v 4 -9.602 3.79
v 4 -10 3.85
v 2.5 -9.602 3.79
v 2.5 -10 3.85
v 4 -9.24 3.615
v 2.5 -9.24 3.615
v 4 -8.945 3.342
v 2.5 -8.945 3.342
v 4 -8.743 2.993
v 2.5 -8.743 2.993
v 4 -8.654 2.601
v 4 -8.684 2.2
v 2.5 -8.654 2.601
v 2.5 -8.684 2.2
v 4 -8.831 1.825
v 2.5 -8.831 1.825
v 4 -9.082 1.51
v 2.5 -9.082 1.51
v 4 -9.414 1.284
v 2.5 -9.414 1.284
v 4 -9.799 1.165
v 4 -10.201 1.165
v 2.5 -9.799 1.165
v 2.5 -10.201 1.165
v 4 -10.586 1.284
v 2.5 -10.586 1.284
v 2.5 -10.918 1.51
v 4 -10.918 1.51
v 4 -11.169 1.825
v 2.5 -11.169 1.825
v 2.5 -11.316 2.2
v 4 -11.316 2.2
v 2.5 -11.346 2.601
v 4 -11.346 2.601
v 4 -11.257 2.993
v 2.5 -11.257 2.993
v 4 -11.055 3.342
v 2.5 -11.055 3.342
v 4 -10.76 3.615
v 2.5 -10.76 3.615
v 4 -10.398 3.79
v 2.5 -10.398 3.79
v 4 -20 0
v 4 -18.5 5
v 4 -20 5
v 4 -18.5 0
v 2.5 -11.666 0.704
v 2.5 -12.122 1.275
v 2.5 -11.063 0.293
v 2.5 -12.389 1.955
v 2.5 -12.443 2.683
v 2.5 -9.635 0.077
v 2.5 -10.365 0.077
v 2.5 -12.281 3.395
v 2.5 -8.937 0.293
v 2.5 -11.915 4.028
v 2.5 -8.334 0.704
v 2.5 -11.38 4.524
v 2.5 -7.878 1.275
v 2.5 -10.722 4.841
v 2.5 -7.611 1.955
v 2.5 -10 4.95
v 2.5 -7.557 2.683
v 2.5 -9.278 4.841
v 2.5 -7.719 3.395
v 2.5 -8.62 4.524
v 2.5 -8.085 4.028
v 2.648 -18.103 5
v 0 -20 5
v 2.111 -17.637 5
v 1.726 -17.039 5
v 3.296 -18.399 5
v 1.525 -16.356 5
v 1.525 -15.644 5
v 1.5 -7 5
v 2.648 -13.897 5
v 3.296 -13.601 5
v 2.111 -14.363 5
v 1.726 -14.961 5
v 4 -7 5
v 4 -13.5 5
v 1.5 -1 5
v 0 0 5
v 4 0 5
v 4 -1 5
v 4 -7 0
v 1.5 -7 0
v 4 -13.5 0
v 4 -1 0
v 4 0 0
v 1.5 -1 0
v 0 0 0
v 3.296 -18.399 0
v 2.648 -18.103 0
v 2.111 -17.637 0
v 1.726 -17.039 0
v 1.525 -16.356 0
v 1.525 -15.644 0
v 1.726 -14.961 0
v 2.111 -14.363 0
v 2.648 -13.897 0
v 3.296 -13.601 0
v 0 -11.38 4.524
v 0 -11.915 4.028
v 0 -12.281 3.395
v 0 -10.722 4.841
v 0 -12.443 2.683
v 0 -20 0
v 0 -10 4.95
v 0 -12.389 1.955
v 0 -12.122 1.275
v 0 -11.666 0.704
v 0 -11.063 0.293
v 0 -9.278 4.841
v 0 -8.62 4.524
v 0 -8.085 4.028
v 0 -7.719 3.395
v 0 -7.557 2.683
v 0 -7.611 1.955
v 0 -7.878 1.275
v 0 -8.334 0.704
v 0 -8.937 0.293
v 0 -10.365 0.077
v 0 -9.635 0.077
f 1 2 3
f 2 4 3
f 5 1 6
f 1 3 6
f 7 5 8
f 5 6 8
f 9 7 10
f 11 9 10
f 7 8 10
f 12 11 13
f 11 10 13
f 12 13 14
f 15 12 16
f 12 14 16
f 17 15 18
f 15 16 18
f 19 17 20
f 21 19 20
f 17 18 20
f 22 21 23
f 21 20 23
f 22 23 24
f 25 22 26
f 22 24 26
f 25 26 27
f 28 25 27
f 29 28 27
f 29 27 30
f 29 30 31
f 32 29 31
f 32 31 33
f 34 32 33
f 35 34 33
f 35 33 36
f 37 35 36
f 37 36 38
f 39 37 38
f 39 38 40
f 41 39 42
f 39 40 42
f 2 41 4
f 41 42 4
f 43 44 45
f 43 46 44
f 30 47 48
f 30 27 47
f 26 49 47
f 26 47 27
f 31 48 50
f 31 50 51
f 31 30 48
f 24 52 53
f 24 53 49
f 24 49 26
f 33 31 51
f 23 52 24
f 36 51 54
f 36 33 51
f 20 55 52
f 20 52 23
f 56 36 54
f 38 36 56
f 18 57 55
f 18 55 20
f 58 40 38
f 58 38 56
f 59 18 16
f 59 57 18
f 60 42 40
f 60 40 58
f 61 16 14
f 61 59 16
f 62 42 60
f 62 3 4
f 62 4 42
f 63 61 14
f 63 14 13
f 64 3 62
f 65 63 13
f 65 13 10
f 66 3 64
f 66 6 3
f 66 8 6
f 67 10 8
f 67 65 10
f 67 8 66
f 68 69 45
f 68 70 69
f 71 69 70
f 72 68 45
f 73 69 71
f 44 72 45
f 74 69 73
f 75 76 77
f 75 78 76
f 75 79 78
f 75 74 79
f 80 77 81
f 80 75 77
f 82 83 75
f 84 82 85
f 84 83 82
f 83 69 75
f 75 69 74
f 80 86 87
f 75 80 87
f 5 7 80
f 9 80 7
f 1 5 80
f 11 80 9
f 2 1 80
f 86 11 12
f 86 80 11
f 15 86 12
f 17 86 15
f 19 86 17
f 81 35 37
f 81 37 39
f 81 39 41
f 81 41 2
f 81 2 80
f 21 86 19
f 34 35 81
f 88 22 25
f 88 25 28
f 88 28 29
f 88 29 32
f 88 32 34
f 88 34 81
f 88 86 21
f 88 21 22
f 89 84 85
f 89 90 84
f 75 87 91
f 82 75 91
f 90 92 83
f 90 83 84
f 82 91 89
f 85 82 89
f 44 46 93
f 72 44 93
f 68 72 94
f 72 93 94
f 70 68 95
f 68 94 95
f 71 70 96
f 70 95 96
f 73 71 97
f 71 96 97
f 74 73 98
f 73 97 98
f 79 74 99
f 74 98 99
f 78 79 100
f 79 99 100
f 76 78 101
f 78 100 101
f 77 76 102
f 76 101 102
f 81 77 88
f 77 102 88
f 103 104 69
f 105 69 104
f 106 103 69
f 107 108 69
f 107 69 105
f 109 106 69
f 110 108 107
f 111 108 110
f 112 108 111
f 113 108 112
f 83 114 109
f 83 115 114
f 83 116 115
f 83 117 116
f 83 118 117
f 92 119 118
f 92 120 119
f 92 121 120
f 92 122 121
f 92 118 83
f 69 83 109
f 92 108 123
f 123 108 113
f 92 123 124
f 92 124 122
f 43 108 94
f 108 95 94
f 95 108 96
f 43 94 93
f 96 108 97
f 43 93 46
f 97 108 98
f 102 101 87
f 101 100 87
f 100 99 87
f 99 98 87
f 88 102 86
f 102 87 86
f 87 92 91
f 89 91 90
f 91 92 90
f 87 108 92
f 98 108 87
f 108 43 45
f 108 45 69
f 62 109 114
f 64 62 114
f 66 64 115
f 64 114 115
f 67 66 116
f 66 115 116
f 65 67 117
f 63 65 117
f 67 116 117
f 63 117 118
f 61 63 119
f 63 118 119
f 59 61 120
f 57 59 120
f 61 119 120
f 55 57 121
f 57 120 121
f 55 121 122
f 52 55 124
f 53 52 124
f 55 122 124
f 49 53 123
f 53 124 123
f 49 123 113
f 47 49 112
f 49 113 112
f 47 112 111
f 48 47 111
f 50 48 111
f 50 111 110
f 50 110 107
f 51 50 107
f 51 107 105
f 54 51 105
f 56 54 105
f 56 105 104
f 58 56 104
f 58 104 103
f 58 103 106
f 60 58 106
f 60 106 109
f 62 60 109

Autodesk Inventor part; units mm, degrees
ref_plane "YZ Plane" through (0, 0, 0) normal (1, 0, 0) x (0, 1, 0)
ref_plane "XZ Plane" through (0, 0, 0) normal (0, 1, 0) x (-1, 0, 0)
ref_plane "XY Plane" through (0, 0, 0) normal (0, 0, 1) x (1, 0, 0)
sketch "Sketch1" plane through (0, 0, 0) normal (0, 0, 1) x (1, 0, 0)
  line L0 (0, 0) -> (4, 0)
  line L1 (4, 0) -> (4, -20)
  line L2 (4, -20) -> (0, -20)
  line L3 (0, -20) -> (0, 0)
  circle A0 centre (4, -4) radius 2.5
  circle A1 centre (4, -16) radius 2.5
  line L4 (1.5, -4) -> (1.5, -7)
  line L5 (1.5, -7) -> (1.5, -1)
  line L6 (4, -7) -> (1.5, -7)
  line L7 (1.5, -1) -> (4, -1)
  point P0 (4, -18.5)
  point P1 (4, -13.5)
  dimension "d2" = 5
  dimension "d0" = 20
  dimension "d1" = 4
  dimension "d3" = 5
  dimension "d4" = 4
  dimension "d5" = 4
  dimension "d6" = 3
  dimension "d7" = 3
extrude "Extrusion1" add sketch "Sketch1" along normal blind 5 contours L0 L1 L7 L5 L4 L6 A1 L2 L3
sketch "Sketch3" plane through (0, -20, 0) normal (-1, 0, 0) x (0, 0, 1)
  circle A0 centre (2.5, 10) radius 1.35
  line L0 (0, 0) -> (5, 0) projected
  line L1 (0, 20) -> (0, 0) projected
  dimension "d10" = 10
  dimension "d11" = 2.5
  dimension "d12" = 20
  dimension "d13" = 2.7
extrude "Extrusion2" cut sketch "Sketch3" against normal blind 20
sketch "Sketch4" plane through (0, -20, 0) normal (-1, 0, 0) x (0, 0, 1)
  circle A0 centre (2.5, 10) radius 1.35 projected
  circle A1 centre (2.5, 10) radius 2.45
  point P0 (0, 20)
  dimension "d16" = 4.9
extrude "Extrusion3" cut sketch "Sketch4" against normal blind 2.5 contours A0 | A1
equation "\"d1\" = d4"
equation "\"d5\" = d4"
properties part number "POMSliderAxis" material "Acetal Resin, White"
